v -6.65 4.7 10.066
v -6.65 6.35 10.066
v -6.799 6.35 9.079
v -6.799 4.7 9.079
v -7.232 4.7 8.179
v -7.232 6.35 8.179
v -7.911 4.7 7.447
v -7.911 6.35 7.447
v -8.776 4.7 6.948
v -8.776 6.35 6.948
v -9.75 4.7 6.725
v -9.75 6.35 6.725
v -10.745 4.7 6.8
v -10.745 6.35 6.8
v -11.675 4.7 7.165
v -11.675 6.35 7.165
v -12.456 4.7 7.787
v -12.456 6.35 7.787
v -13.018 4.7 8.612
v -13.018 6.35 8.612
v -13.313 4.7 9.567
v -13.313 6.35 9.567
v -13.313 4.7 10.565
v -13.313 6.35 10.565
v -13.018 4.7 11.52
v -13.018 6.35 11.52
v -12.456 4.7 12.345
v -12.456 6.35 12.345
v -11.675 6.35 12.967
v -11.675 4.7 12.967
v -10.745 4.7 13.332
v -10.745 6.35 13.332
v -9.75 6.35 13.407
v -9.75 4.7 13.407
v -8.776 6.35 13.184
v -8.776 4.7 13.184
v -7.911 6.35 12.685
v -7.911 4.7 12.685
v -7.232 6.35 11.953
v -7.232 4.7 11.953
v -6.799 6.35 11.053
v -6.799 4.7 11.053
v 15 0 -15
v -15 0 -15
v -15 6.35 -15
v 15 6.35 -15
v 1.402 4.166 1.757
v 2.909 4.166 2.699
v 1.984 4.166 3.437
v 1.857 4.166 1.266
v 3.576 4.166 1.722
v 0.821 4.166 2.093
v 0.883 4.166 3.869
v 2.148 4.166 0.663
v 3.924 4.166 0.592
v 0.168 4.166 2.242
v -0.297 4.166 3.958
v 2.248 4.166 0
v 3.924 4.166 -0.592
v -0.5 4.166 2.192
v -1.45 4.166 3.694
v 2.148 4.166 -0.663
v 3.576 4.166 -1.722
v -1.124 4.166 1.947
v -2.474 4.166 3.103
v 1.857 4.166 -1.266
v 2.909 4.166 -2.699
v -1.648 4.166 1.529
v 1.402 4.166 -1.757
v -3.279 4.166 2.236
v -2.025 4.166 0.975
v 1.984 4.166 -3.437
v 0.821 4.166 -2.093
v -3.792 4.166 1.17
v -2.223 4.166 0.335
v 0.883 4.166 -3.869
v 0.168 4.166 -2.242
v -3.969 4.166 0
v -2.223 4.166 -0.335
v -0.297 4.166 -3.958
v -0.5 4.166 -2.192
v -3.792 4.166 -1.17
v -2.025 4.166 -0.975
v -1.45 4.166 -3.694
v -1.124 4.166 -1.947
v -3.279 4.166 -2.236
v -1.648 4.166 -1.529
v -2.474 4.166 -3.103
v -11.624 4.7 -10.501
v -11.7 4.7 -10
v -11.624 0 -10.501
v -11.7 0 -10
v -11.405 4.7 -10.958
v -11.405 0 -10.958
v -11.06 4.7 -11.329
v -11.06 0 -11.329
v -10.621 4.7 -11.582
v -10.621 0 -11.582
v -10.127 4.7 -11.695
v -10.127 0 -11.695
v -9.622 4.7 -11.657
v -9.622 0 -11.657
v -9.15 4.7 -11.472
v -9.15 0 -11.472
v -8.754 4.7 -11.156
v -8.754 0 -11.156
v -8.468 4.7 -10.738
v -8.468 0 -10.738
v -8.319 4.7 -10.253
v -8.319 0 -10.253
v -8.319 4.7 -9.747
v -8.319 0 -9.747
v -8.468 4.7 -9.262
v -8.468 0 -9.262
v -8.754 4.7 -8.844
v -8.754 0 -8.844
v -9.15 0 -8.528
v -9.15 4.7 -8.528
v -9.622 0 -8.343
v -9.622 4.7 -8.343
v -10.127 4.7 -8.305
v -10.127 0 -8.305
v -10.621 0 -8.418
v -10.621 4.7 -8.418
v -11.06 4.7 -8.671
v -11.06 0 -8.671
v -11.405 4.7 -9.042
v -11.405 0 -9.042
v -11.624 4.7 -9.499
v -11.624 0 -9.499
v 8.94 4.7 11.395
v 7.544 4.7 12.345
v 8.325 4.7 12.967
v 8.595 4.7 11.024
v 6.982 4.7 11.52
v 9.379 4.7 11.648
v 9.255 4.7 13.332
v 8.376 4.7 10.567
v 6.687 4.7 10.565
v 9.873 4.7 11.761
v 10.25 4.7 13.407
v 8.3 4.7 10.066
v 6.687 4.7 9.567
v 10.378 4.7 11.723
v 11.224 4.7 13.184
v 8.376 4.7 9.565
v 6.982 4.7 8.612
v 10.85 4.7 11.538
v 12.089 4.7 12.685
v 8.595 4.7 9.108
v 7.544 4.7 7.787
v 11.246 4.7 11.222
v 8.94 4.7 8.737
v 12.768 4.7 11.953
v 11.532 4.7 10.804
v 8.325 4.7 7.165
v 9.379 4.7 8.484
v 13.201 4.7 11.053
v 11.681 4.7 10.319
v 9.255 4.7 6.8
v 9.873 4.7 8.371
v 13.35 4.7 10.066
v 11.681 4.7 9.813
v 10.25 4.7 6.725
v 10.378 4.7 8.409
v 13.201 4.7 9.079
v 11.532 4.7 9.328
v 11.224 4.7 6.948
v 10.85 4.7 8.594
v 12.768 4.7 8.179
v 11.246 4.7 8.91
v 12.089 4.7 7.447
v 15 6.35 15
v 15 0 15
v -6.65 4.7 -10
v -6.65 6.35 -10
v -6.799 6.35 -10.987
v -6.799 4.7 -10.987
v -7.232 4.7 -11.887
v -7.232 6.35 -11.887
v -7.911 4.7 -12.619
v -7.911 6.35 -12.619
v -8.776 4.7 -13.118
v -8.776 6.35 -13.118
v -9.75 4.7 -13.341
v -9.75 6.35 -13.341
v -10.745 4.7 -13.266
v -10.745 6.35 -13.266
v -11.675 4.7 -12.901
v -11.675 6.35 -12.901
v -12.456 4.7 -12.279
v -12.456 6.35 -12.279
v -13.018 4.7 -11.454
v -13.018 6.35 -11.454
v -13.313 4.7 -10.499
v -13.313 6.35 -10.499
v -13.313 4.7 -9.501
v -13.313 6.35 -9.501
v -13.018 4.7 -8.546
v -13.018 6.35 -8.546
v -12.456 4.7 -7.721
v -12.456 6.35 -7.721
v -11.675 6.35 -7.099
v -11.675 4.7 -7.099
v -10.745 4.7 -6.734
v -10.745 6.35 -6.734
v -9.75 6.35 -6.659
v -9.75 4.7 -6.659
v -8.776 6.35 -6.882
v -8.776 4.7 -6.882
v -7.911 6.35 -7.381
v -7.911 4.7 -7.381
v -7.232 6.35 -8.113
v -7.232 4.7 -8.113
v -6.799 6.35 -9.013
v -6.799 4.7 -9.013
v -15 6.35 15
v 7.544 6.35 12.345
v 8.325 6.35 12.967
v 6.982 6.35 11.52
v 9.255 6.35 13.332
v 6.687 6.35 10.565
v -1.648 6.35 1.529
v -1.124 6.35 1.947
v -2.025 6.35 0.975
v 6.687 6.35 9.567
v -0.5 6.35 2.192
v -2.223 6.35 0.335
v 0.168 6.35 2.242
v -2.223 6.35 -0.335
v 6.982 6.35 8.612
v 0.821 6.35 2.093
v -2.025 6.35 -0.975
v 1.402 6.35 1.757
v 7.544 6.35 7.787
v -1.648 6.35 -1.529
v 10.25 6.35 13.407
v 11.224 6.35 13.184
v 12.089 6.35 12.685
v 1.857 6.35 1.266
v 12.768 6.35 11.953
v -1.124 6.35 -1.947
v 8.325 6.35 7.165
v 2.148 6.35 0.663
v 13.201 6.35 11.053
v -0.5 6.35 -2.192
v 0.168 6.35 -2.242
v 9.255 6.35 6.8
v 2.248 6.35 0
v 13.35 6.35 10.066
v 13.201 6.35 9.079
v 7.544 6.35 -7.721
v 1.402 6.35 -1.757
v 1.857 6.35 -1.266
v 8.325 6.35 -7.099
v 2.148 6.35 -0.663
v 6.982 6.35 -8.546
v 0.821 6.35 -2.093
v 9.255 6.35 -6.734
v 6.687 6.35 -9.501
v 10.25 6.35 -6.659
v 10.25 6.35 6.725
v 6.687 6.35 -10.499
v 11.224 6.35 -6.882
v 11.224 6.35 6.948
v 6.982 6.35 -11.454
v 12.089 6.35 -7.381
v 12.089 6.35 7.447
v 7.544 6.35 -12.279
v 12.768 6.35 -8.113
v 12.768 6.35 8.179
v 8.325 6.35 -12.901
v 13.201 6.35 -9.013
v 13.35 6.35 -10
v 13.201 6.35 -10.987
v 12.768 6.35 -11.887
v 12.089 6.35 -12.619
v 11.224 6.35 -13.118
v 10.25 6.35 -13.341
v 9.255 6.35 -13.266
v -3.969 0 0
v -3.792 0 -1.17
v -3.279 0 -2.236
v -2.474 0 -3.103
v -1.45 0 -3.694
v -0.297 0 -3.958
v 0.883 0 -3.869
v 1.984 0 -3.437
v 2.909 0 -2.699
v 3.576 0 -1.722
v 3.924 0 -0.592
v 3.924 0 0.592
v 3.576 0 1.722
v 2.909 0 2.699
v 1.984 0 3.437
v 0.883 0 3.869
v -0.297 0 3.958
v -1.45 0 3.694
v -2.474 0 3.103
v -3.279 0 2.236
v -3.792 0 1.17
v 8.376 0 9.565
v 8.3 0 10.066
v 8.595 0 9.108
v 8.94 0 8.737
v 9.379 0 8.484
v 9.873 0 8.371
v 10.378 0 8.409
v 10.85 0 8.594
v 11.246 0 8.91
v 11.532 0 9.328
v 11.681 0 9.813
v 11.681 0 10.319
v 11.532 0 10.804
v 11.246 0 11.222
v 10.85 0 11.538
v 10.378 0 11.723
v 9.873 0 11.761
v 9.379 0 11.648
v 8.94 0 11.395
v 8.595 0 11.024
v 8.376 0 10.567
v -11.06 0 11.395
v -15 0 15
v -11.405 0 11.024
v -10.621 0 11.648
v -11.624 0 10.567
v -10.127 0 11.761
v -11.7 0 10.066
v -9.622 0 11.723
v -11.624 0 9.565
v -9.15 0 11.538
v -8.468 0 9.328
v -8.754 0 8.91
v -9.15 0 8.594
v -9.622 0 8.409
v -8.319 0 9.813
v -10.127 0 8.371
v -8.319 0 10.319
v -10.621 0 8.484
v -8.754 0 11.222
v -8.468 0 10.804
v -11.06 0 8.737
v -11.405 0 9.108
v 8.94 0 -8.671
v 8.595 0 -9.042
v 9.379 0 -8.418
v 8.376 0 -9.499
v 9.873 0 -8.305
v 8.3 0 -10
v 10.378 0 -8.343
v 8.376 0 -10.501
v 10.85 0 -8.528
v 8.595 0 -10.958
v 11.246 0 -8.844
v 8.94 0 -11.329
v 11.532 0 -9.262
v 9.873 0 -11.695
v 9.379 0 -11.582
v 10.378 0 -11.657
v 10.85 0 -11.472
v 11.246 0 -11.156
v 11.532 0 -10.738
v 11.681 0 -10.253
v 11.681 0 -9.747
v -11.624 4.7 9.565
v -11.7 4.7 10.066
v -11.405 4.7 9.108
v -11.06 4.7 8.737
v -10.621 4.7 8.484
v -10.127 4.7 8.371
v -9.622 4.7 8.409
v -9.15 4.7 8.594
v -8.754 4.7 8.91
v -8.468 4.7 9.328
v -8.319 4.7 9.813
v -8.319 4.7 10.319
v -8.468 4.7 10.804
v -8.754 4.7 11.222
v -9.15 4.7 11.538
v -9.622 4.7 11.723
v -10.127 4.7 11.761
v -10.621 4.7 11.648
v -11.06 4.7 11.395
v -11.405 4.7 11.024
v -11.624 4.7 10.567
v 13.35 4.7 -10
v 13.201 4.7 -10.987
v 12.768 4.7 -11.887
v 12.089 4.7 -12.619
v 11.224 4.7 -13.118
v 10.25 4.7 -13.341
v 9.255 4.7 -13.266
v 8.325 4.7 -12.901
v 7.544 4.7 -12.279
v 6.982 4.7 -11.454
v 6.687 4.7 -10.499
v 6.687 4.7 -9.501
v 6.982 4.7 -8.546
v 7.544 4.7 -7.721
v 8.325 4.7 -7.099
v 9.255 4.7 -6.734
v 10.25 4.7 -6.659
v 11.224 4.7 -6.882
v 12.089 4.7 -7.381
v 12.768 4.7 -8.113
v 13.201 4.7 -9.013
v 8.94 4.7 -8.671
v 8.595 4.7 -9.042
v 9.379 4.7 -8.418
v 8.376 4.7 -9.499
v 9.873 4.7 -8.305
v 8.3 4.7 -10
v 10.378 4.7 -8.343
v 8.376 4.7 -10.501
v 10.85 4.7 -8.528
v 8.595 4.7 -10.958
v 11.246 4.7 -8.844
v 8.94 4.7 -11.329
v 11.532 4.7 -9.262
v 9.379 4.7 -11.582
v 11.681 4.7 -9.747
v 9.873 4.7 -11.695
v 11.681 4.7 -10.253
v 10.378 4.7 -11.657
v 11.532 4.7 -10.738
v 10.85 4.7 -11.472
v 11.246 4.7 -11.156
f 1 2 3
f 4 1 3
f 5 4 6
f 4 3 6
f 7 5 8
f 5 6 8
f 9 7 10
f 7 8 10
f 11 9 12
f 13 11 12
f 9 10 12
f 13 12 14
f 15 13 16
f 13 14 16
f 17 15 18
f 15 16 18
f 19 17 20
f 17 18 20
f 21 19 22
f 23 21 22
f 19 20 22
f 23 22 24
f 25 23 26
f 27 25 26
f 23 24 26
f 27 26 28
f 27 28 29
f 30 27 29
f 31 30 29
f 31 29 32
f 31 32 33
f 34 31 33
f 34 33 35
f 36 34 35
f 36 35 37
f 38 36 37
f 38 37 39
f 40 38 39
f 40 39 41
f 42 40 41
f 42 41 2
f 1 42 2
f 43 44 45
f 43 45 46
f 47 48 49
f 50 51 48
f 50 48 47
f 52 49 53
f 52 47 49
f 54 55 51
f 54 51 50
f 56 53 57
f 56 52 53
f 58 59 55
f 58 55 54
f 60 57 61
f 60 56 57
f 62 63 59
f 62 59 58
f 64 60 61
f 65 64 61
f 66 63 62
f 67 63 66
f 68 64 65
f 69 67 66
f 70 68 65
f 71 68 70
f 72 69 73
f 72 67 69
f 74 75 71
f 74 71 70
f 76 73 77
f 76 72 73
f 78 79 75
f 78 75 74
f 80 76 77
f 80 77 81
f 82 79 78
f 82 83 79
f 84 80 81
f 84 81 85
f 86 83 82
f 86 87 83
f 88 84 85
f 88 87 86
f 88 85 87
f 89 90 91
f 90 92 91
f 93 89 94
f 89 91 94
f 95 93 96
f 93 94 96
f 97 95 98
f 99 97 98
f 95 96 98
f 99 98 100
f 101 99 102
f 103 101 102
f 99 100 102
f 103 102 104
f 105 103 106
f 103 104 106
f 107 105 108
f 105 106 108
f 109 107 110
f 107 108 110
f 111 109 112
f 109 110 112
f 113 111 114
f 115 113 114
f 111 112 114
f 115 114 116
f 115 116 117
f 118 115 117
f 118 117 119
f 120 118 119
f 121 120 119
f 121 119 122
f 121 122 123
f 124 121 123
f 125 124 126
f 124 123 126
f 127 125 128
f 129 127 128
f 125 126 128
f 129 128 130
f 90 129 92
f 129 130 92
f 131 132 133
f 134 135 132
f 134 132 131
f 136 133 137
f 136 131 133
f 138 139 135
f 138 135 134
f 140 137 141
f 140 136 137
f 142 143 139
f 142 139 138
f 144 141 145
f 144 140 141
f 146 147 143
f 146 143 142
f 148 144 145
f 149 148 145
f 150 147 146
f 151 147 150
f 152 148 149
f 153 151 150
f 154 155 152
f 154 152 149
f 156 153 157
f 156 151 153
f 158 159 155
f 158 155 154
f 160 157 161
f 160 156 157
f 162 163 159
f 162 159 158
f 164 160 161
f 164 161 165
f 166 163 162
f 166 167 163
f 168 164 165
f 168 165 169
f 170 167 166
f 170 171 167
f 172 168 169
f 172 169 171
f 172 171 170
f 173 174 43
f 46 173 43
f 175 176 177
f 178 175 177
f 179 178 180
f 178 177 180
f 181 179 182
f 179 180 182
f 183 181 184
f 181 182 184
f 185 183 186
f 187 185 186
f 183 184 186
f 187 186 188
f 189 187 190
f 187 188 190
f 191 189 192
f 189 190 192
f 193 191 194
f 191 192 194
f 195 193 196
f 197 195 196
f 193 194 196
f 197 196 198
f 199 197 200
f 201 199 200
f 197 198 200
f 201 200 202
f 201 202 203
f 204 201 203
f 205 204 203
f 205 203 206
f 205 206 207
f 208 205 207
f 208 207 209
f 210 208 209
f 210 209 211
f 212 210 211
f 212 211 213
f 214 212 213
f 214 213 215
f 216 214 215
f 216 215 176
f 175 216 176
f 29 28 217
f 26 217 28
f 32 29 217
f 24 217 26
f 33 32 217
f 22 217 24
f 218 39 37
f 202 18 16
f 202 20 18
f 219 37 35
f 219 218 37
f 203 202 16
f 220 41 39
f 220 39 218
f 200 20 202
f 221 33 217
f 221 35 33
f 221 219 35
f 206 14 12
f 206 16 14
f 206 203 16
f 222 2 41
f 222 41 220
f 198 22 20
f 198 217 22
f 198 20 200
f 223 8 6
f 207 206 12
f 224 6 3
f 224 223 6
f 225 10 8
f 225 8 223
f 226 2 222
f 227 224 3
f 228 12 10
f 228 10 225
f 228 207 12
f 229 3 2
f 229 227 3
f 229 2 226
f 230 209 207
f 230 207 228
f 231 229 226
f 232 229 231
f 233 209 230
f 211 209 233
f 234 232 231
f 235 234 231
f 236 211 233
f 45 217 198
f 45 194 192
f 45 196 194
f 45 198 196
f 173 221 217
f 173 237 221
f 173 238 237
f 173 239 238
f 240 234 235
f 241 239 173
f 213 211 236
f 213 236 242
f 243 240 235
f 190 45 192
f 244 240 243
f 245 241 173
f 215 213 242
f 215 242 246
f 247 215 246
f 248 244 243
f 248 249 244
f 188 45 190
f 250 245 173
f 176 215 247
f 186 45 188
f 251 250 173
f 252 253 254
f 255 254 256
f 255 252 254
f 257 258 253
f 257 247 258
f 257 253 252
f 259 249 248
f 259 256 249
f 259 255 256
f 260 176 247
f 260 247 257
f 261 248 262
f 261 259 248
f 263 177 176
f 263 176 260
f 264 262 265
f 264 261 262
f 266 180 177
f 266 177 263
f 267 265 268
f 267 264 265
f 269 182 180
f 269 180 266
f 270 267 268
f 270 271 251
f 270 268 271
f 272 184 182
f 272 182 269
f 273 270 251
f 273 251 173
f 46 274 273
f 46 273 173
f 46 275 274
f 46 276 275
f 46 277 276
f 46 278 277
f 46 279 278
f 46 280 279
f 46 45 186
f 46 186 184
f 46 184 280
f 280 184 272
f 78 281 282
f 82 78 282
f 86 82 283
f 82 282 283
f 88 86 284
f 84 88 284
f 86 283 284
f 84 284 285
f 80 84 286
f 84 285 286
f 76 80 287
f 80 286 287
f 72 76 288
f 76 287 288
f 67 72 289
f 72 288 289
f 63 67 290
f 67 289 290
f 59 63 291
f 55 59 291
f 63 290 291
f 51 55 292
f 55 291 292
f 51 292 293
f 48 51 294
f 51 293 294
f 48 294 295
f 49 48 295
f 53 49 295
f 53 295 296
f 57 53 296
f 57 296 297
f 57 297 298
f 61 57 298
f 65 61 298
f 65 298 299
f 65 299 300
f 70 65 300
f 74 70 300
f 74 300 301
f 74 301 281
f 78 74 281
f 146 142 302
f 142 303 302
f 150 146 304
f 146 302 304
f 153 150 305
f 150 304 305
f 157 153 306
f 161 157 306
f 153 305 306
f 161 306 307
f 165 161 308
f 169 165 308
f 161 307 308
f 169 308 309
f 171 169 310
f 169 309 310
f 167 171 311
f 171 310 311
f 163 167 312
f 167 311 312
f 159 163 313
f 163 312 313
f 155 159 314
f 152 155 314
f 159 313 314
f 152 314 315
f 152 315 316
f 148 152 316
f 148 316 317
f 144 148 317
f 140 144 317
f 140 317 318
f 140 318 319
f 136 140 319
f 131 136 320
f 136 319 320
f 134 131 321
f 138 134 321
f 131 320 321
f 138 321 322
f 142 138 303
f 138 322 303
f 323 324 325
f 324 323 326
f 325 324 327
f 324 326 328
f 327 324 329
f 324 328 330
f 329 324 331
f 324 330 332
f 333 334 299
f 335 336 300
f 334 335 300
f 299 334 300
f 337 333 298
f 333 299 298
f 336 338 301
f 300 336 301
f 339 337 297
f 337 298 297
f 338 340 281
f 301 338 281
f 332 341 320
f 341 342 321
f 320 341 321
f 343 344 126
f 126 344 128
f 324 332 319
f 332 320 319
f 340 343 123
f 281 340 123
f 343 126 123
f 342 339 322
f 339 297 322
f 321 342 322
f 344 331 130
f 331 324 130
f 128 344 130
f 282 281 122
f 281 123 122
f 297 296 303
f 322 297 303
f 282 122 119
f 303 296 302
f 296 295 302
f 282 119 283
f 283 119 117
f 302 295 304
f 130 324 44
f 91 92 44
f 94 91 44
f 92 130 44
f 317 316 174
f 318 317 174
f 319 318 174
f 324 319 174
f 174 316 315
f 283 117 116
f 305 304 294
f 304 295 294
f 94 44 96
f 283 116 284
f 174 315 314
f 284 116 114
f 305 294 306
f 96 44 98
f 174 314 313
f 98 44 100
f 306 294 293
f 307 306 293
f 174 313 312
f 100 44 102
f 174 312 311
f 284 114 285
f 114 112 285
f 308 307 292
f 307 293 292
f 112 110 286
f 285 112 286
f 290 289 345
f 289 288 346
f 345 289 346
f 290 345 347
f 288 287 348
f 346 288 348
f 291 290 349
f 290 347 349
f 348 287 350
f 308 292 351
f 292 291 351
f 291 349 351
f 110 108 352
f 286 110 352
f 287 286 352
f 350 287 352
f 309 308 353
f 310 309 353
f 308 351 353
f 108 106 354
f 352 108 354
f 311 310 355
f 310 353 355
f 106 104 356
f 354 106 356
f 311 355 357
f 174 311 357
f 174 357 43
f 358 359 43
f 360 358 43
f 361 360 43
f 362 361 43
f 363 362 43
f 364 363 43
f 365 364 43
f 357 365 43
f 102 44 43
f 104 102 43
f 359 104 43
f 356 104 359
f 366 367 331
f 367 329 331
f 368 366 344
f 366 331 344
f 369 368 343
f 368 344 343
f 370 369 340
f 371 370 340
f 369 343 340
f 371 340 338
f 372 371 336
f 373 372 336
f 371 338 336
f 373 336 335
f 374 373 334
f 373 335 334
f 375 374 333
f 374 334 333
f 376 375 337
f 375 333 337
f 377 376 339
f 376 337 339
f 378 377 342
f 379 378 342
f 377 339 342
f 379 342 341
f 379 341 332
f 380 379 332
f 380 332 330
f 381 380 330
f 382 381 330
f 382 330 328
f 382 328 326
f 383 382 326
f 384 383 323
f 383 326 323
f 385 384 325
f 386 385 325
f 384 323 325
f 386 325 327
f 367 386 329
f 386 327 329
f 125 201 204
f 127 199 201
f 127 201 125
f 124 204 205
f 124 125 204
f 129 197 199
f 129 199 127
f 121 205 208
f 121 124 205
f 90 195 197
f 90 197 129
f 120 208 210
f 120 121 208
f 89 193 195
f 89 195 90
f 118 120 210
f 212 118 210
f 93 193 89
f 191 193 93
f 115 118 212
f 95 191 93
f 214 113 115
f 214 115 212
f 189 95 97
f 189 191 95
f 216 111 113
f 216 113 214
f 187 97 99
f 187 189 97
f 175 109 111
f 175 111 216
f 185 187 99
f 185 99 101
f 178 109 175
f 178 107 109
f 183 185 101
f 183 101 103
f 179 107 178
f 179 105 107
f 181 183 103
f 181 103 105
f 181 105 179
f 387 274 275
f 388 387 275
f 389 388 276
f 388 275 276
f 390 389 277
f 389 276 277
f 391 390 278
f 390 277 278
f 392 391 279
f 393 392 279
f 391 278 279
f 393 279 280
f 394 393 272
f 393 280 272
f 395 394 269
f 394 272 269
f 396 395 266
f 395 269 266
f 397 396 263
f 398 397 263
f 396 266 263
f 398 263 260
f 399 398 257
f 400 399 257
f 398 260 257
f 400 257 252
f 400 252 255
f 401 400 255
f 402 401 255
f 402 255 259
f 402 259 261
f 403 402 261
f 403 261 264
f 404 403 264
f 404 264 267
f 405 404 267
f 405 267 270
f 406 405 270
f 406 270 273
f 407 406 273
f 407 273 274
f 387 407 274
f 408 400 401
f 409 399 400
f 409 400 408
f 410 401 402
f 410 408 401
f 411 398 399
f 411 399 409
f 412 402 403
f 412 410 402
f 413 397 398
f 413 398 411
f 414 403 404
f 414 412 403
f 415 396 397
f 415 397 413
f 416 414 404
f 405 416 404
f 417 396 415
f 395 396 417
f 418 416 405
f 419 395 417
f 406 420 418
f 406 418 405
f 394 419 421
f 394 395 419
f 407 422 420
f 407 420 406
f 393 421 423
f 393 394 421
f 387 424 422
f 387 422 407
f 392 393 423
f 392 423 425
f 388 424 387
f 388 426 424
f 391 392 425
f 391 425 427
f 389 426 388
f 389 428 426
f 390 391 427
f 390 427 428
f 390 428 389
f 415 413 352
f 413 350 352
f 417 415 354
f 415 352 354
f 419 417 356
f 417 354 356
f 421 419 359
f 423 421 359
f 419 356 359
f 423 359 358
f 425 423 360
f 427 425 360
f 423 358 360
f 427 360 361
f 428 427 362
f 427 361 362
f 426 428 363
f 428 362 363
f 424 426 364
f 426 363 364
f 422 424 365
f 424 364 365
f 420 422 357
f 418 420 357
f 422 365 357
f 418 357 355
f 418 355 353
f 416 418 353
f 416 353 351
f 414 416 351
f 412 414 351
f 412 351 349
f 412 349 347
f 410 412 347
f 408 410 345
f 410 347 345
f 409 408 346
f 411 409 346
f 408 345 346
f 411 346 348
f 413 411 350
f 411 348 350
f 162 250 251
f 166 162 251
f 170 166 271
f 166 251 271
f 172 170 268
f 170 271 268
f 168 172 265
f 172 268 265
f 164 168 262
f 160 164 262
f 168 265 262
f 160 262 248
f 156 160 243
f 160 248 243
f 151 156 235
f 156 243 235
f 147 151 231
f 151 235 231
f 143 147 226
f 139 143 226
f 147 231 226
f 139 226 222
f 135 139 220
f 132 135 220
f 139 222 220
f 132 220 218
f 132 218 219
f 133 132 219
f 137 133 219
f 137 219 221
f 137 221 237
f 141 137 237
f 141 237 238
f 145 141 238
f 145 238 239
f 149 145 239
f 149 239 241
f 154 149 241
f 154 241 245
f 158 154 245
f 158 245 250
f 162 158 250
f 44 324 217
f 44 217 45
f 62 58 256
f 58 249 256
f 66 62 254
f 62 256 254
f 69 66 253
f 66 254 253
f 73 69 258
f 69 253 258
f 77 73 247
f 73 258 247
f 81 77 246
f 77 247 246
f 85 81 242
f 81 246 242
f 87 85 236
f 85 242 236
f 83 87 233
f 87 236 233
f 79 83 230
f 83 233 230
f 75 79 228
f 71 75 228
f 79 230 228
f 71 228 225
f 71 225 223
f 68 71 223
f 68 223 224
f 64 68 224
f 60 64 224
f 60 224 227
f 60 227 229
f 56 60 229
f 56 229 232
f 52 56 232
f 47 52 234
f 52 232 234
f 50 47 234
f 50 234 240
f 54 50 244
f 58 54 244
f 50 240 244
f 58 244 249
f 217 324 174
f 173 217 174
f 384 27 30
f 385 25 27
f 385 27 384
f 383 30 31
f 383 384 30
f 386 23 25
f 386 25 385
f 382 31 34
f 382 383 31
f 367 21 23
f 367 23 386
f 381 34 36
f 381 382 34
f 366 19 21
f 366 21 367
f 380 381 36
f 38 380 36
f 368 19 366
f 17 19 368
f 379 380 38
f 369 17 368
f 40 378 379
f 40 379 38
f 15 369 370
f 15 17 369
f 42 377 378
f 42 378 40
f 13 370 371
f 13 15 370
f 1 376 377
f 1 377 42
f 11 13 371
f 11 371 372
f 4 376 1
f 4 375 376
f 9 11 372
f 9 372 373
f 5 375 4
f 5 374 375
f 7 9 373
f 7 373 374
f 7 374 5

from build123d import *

# Parameters (mm, degrees)
SKETCH1_W                                           = 30
SKETCH1_H                                           = 30
MOUNT_BLOCK_DEPTH                                   = 6.35
LINEAR_STAGE_CBORE_FOR_M3_SBHCS1_D                  = 3.4
LINEAR_STAGE_CBORE_FOR_M3_SBHCS1_CBORE_D            = 6.7
LINEAR_STAGE_CBORE_FOR_M3_SBHCS1_CBORE_DEPTH        = 1.65
OPTICAL_POST_CBORE_FOR_8_SOCKET_HEAD_CA_D           = 4.4958
OPTICAL_POST_CBORE_FOR_8_SOCKET_HEAD_CA_CBORE_D     = 7.9375
OPTICAL_POST_CBORE_FOR_8_SOCKET_HEAD_CA_CBORE_DEPTH = 4.1656


with BuildPart() as part:
    # Sketch1 → Mount Block (new body)
    with BuildSketch(Plane(origin=(0, 0, 0), x_dir=(1, 0, 0), z_dir=(0, 1, 0))):
        Rectangle(SKETCH1_W, SKETCH1_H)
    extrude(amount=MOUNT_BLOCK_DEPTH)

    # Linear Stage CBORE for M3 SBHCS1 (through all)
    with Locations(Plane(origin=(0, 6.35, 0), x_dir=(1, 0, 0), z_dir=(0, 1, 0))):
        with Locations((-10, 10), (10, 10), (10, -10.066), (-10, -10.066)):
            CounterBoreHole(LINEAR_STAGE_CBORE_FOR_M3_SBHCS1_D / 2, LINEAR_STAGE_CBORE_FOR_M3_SBHCS1_CBORE_D / 2, LINEAR_STAGE_CBORE_FOR_M3_SBHCS1_CBORE_DEPTH)

    # Optical Post CBORE for #8 Socket Head Cap Screw (through all)
    with Locations(Plane(origin=(0, 0, 0), x_dir=(-1, 0, 0), z_dir=(0, -1, 0))):
        with Locations((0, 0)):
            CounterBoreHole(OPTICAL_POST_CBORE_FOR_8_SOCKET_HEAD_CA_D / 2, OPTICAL_POST_CBORE_FOR_8_SOCKET_HEAD_CA_CBORE_D / 2, OPTICAL_POST_CBORE_FOR_8_SOCKET_HEAD_CA_CBORE_DEPTH)


solid = part.part
